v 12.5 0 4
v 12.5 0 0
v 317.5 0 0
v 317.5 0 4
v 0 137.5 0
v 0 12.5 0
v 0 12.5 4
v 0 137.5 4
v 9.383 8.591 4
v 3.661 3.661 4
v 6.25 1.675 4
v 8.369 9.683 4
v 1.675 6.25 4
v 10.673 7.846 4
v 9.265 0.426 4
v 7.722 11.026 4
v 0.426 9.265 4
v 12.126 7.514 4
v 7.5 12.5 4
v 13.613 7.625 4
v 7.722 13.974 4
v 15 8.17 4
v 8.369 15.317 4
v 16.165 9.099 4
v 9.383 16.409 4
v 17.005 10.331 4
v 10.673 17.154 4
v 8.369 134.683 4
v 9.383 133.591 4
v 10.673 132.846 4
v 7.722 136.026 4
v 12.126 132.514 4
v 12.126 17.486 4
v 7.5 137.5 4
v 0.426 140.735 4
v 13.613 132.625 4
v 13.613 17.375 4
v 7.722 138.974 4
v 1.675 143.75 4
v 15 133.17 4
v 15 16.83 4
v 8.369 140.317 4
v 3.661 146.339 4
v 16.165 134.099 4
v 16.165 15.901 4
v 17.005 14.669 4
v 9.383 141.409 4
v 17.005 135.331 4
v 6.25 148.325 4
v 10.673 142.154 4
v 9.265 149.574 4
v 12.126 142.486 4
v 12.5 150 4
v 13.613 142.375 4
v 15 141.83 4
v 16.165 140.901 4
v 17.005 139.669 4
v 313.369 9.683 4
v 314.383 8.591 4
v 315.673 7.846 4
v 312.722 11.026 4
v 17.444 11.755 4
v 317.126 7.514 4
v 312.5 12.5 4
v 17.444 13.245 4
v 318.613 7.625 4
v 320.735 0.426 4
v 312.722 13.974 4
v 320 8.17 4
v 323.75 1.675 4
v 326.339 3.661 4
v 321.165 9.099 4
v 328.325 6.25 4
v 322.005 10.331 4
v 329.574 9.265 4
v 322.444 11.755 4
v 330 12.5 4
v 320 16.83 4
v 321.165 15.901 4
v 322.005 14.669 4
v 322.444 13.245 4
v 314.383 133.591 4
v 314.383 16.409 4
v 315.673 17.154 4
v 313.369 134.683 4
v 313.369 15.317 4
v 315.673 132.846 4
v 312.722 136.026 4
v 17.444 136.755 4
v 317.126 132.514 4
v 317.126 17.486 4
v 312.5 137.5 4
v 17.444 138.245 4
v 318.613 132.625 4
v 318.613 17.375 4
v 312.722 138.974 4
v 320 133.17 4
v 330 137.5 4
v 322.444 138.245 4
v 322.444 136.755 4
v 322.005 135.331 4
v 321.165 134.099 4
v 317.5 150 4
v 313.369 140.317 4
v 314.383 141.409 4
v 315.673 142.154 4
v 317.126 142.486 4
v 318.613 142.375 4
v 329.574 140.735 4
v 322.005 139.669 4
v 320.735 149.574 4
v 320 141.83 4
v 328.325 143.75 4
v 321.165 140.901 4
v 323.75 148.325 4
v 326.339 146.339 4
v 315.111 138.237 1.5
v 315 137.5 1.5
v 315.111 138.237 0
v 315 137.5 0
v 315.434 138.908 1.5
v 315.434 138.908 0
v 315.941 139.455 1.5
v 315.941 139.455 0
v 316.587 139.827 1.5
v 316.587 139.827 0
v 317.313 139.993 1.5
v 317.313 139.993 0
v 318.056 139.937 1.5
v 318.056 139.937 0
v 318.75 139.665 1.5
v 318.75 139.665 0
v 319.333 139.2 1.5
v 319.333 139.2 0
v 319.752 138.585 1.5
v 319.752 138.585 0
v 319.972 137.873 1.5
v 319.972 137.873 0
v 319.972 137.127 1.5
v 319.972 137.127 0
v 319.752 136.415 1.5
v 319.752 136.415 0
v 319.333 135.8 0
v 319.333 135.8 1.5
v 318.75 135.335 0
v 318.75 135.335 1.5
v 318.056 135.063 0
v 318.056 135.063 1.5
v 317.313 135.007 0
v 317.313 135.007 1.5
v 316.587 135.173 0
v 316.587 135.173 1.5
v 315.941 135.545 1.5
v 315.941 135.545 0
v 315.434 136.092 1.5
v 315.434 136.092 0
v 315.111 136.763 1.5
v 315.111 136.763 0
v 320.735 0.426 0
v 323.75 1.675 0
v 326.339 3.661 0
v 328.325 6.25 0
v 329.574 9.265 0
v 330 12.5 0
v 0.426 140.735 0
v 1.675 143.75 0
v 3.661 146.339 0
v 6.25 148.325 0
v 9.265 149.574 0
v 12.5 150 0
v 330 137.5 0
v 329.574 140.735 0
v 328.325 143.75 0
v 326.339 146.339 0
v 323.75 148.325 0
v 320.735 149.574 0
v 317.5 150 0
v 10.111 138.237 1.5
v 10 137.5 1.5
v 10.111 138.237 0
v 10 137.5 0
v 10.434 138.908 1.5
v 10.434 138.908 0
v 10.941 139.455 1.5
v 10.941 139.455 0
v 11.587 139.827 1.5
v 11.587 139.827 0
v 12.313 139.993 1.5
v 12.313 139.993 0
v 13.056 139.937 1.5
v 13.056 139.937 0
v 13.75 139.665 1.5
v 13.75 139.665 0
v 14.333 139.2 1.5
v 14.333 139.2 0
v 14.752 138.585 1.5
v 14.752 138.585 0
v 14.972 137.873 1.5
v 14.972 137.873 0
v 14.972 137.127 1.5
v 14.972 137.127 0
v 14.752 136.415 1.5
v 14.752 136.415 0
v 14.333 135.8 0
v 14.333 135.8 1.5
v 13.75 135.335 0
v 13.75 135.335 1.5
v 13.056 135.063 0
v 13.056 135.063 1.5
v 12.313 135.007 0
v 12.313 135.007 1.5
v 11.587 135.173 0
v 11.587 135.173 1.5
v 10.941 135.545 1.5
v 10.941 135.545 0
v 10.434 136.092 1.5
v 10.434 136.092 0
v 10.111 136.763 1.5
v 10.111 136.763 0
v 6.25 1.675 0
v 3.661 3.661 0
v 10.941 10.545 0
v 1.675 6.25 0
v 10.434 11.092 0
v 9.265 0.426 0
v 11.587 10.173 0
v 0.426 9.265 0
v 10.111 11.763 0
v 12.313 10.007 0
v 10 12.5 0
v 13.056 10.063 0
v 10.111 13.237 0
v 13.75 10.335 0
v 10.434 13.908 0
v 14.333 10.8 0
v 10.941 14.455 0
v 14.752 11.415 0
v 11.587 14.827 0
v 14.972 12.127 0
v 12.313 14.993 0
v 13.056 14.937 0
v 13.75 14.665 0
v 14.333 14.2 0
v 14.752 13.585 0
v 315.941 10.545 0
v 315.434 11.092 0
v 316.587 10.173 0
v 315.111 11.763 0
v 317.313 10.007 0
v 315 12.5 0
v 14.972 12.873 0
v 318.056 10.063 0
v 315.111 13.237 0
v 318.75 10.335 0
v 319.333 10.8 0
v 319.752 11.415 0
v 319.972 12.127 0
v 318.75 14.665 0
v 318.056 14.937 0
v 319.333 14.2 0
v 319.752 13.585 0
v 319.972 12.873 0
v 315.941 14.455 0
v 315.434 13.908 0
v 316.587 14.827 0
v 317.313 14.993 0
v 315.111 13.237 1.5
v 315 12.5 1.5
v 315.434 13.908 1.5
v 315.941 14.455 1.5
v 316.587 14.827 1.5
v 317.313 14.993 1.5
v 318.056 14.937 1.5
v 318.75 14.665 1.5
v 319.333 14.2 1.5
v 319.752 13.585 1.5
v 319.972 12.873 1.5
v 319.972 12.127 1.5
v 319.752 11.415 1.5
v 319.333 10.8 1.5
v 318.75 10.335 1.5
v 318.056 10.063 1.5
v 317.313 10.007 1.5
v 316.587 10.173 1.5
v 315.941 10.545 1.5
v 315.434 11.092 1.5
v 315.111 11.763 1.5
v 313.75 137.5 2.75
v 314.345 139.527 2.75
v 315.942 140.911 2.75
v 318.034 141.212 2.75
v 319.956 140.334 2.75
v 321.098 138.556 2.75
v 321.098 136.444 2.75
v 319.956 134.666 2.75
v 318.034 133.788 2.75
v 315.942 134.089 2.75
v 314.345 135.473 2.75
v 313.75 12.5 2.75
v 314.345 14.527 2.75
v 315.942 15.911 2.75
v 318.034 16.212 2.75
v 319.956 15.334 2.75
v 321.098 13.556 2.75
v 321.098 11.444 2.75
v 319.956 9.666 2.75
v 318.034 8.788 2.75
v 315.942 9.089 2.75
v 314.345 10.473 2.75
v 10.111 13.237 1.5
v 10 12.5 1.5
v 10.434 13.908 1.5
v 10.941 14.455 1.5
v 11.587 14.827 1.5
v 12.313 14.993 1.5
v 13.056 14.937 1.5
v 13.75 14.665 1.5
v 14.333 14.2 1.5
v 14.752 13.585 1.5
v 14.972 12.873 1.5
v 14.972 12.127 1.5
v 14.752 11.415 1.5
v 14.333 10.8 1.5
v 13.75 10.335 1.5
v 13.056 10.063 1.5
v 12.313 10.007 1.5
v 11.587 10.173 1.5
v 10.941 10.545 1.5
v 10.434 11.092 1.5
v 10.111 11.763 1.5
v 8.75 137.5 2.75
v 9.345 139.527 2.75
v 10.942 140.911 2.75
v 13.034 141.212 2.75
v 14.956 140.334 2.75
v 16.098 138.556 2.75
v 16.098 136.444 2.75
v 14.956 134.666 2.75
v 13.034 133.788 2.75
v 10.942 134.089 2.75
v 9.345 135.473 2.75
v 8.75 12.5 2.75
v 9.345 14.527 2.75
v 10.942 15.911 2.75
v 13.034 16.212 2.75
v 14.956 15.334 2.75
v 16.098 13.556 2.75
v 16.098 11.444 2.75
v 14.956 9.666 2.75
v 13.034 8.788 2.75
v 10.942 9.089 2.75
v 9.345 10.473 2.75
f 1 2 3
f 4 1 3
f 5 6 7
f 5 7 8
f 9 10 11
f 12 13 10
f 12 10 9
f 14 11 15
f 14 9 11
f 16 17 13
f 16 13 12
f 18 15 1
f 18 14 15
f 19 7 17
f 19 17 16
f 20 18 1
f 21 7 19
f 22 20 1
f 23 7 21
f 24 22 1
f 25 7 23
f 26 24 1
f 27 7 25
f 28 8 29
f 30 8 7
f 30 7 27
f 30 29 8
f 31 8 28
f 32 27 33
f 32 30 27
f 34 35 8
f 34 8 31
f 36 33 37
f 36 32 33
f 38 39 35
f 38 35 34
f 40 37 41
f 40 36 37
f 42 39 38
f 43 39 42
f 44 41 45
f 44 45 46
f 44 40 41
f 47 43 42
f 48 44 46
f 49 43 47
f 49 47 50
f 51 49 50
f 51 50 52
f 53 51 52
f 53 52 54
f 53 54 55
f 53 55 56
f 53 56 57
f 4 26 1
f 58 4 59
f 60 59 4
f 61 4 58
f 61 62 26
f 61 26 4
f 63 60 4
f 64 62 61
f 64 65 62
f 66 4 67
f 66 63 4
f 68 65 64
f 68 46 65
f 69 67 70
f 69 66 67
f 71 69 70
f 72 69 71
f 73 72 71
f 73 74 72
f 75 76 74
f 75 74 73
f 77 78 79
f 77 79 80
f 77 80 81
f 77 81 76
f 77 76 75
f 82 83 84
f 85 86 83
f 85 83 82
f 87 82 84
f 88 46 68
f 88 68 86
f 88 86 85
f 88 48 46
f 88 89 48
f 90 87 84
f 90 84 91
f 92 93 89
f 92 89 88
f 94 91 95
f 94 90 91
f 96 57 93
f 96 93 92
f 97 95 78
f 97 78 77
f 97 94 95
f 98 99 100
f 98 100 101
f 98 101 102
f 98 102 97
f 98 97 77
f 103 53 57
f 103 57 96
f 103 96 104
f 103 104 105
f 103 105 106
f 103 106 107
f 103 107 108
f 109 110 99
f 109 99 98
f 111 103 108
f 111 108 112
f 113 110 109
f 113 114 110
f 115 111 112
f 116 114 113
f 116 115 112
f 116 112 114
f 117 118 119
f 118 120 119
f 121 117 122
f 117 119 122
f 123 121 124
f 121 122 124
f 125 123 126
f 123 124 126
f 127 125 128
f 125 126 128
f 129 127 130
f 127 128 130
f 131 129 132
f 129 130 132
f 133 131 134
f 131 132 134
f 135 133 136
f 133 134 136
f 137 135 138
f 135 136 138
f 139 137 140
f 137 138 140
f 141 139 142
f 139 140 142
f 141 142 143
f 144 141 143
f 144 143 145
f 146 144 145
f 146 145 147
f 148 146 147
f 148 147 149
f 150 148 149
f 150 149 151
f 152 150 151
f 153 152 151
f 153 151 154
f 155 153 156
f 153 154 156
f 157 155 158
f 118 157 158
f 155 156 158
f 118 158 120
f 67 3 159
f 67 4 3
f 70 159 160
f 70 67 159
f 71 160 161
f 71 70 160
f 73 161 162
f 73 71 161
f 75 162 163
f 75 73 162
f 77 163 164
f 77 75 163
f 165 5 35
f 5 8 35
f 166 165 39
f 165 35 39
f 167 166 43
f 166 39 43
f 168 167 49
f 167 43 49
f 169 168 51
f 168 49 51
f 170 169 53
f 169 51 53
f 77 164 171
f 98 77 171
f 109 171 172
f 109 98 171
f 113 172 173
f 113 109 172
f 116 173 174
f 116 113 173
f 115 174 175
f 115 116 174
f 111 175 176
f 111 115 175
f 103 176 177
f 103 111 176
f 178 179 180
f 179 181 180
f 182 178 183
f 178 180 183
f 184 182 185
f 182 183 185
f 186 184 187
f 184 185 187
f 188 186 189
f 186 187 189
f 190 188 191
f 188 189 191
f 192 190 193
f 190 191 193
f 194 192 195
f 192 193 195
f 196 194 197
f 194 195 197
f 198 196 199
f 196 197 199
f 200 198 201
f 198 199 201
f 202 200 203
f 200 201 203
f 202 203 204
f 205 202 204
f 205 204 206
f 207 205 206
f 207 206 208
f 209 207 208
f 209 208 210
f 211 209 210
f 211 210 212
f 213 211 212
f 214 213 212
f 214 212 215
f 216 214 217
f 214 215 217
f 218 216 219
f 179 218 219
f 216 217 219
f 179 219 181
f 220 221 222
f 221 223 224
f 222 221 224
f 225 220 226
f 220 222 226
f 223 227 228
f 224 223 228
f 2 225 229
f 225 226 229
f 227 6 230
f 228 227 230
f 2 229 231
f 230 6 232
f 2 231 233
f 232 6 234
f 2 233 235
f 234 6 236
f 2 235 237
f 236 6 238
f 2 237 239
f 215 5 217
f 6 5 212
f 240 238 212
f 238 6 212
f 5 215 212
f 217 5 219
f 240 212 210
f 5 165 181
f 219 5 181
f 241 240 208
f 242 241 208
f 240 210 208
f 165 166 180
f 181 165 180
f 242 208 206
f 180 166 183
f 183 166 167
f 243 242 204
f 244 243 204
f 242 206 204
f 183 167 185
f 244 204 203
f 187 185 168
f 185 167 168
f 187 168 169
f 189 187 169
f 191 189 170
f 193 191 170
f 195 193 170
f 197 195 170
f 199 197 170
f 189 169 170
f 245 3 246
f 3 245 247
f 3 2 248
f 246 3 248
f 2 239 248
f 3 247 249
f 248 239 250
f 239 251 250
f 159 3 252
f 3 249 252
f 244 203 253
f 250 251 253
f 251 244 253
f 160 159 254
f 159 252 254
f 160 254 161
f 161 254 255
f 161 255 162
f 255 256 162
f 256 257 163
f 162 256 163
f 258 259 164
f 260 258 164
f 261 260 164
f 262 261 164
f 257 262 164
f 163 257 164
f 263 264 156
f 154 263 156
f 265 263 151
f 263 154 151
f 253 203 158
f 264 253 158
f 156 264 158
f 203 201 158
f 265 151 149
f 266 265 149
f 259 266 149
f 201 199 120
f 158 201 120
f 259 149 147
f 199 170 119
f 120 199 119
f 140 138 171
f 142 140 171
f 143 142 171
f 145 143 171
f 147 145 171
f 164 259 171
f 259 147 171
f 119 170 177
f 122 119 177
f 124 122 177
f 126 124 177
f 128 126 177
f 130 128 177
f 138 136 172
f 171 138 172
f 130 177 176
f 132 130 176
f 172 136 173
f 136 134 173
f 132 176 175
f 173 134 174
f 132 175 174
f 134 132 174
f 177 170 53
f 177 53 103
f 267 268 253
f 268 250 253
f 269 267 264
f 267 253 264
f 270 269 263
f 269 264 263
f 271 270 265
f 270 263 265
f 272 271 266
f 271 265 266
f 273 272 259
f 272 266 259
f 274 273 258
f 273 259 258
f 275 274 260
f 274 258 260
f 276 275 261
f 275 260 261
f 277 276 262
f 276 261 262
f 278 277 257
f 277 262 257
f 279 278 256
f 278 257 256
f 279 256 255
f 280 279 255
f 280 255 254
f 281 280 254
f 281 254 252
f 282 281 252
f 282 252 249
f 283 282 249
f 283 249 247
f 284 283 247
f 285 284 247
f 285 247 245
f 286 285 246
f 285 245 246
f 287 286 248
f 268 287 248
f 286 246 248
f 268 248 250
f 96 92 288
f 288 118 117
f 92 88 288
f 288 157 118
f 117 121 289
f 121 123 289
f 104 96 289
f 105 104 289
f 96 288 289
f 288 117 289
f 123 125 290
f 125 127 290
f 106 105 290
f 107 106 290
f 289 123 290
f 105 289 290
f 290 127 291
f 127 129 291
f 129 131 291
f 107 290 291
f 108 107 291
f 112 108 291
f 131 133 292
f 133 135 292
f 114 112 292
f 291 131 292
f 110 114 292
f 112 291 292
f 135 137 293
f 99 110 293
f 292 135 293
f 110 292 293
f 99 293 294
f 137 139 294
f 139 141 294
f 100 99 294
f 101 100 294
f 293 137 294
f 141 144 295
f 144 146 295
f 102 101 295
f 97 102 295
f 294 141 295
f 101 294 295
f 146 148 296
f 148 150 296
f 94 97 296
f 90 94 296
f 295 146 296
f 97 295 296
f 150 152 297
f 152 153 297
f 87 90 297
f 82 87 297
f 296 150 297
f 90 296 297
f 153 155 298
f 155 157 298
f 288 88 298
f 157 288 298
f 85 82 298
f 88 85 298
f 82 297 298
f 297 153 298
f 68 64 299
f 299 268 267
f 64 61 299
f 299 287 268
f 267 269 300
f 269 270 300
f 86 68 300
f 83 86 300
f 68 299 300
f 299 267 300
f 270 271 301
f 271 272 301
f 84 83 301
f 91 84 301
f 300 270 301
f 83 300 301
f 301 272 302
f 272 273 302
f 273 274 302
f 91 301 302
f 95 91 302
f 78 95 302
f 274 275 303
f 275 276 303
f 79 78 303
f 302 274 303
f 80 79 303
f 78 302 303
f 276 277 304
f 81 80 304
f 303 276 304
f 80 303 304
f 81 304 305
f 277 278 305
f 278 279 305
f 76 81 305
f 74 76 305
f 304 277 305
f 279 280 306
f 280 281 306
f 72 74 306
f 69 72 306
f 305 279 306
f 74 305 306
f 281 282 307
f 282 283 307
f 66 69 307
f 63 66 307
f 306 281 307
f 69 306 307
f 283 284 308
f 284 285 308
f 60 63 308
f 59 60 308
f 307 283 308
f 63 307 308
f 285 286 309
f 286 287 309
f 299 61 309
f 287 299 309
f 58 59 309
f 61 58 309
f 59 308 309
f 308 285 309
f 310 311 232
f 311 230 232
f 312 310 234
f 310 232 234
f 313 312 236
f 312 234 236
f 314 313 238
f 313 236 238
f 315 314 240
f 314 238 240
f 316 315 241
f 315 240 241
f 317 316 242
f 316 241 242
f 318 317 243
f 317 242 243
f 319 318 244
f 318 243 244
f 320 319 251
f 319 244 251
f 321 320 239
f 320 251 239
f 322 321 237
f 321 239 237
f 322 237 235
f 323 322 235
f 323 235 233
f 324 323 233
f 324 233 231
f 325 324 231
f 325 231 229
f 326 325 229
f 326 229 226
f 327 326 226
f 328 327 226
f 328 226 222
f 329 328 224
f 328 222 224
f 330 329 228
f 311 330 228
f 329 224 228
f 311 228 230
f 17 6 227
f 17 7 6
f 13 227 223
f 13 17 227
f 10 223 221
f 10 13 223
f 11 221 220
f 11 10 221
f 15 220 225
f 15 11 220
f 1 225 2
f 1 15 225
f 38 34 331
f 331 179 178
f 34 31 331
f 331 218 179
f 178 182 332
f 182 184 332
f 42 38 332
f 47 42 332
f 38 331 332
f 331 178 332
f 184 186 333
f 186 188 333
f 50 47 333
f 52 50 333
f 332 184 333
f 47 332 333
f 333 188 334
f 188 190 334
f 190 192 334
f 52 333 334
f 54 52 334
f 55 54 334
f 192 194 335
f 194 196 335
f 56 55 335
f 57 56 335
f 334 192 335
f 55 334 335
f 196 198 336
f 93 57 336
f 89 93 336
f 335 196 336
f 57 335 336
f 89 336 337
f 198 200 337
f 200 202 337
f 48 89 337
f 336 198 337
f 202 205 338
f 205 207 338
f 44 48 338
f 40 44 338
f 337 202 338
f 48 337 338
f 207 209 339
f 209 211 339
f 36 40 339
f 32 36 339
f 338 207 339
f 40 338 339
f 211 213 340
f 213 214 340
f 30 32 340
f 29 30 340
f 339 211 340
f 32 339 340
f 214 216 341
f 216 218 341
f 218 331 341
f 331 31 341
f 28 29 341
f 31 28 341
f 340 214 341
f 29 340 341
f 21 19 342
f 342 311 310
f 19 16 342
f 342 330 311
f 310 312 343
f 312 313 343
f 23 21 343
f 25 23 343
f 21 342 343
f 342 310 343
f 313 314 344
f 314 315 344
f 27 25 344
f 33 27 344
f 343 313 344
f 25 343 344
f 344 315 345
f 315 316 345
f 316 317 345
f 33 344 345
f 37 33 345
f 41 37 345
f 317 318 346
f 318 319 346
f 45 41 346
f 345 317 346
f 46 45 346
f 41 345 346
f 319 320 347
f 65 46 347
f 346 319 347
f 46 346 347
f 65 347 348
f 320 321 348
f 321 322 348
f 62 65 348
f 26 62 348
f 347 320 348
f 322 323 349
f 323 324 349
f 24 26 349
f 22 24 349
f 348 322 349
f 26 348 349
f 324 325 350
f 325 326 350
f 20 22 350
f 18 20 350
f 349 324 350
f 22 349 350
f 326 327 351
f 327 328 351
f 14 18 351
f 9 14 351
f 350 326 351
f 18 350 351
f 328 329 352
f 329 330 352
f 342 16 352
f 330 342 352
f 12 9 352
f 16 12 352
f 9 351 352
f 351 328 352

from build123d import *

# Parameters (mm, degrees)
F0_W           = 330
F0_H           = 150
F1_DEPTH       = 4
F2_R           = 12.5
F4_D           = 5
F4_CSINK_D     = 10
F4_CSINK_ANGLE = 90


with BuildPart() as f1:
    # F0 (on Top) → F1 (new body)
    with BuildSketch(Plane.XY):
        with Locations((165, 75)):
            Rectangle(F0_W, F0_H)
    extrude(amount=F1_DEPTH)

    # F2
    f2_edges = [f1.edges().sort_by_distance(p)[0] for p in [
        (330, 0, 2),
        (330, 150, 2),
        (0, 150, 2),
        (0, 0, 2),
    ]]
    fillet(f2_edges, radius=F2_R)

    # F4 (through all)
    with Locations(Plane.XY.offset(4)):
        with Locations((12.5, 137.5), (317.5, 137.5), (317.5, 12.5), (12.5, 12.5)):
            CounterSinkHole(F4_D / 2, F4_CSINK_D / 2, counter_sink_angle=F4_CSINK_ANGLE)


solid = f1.part
